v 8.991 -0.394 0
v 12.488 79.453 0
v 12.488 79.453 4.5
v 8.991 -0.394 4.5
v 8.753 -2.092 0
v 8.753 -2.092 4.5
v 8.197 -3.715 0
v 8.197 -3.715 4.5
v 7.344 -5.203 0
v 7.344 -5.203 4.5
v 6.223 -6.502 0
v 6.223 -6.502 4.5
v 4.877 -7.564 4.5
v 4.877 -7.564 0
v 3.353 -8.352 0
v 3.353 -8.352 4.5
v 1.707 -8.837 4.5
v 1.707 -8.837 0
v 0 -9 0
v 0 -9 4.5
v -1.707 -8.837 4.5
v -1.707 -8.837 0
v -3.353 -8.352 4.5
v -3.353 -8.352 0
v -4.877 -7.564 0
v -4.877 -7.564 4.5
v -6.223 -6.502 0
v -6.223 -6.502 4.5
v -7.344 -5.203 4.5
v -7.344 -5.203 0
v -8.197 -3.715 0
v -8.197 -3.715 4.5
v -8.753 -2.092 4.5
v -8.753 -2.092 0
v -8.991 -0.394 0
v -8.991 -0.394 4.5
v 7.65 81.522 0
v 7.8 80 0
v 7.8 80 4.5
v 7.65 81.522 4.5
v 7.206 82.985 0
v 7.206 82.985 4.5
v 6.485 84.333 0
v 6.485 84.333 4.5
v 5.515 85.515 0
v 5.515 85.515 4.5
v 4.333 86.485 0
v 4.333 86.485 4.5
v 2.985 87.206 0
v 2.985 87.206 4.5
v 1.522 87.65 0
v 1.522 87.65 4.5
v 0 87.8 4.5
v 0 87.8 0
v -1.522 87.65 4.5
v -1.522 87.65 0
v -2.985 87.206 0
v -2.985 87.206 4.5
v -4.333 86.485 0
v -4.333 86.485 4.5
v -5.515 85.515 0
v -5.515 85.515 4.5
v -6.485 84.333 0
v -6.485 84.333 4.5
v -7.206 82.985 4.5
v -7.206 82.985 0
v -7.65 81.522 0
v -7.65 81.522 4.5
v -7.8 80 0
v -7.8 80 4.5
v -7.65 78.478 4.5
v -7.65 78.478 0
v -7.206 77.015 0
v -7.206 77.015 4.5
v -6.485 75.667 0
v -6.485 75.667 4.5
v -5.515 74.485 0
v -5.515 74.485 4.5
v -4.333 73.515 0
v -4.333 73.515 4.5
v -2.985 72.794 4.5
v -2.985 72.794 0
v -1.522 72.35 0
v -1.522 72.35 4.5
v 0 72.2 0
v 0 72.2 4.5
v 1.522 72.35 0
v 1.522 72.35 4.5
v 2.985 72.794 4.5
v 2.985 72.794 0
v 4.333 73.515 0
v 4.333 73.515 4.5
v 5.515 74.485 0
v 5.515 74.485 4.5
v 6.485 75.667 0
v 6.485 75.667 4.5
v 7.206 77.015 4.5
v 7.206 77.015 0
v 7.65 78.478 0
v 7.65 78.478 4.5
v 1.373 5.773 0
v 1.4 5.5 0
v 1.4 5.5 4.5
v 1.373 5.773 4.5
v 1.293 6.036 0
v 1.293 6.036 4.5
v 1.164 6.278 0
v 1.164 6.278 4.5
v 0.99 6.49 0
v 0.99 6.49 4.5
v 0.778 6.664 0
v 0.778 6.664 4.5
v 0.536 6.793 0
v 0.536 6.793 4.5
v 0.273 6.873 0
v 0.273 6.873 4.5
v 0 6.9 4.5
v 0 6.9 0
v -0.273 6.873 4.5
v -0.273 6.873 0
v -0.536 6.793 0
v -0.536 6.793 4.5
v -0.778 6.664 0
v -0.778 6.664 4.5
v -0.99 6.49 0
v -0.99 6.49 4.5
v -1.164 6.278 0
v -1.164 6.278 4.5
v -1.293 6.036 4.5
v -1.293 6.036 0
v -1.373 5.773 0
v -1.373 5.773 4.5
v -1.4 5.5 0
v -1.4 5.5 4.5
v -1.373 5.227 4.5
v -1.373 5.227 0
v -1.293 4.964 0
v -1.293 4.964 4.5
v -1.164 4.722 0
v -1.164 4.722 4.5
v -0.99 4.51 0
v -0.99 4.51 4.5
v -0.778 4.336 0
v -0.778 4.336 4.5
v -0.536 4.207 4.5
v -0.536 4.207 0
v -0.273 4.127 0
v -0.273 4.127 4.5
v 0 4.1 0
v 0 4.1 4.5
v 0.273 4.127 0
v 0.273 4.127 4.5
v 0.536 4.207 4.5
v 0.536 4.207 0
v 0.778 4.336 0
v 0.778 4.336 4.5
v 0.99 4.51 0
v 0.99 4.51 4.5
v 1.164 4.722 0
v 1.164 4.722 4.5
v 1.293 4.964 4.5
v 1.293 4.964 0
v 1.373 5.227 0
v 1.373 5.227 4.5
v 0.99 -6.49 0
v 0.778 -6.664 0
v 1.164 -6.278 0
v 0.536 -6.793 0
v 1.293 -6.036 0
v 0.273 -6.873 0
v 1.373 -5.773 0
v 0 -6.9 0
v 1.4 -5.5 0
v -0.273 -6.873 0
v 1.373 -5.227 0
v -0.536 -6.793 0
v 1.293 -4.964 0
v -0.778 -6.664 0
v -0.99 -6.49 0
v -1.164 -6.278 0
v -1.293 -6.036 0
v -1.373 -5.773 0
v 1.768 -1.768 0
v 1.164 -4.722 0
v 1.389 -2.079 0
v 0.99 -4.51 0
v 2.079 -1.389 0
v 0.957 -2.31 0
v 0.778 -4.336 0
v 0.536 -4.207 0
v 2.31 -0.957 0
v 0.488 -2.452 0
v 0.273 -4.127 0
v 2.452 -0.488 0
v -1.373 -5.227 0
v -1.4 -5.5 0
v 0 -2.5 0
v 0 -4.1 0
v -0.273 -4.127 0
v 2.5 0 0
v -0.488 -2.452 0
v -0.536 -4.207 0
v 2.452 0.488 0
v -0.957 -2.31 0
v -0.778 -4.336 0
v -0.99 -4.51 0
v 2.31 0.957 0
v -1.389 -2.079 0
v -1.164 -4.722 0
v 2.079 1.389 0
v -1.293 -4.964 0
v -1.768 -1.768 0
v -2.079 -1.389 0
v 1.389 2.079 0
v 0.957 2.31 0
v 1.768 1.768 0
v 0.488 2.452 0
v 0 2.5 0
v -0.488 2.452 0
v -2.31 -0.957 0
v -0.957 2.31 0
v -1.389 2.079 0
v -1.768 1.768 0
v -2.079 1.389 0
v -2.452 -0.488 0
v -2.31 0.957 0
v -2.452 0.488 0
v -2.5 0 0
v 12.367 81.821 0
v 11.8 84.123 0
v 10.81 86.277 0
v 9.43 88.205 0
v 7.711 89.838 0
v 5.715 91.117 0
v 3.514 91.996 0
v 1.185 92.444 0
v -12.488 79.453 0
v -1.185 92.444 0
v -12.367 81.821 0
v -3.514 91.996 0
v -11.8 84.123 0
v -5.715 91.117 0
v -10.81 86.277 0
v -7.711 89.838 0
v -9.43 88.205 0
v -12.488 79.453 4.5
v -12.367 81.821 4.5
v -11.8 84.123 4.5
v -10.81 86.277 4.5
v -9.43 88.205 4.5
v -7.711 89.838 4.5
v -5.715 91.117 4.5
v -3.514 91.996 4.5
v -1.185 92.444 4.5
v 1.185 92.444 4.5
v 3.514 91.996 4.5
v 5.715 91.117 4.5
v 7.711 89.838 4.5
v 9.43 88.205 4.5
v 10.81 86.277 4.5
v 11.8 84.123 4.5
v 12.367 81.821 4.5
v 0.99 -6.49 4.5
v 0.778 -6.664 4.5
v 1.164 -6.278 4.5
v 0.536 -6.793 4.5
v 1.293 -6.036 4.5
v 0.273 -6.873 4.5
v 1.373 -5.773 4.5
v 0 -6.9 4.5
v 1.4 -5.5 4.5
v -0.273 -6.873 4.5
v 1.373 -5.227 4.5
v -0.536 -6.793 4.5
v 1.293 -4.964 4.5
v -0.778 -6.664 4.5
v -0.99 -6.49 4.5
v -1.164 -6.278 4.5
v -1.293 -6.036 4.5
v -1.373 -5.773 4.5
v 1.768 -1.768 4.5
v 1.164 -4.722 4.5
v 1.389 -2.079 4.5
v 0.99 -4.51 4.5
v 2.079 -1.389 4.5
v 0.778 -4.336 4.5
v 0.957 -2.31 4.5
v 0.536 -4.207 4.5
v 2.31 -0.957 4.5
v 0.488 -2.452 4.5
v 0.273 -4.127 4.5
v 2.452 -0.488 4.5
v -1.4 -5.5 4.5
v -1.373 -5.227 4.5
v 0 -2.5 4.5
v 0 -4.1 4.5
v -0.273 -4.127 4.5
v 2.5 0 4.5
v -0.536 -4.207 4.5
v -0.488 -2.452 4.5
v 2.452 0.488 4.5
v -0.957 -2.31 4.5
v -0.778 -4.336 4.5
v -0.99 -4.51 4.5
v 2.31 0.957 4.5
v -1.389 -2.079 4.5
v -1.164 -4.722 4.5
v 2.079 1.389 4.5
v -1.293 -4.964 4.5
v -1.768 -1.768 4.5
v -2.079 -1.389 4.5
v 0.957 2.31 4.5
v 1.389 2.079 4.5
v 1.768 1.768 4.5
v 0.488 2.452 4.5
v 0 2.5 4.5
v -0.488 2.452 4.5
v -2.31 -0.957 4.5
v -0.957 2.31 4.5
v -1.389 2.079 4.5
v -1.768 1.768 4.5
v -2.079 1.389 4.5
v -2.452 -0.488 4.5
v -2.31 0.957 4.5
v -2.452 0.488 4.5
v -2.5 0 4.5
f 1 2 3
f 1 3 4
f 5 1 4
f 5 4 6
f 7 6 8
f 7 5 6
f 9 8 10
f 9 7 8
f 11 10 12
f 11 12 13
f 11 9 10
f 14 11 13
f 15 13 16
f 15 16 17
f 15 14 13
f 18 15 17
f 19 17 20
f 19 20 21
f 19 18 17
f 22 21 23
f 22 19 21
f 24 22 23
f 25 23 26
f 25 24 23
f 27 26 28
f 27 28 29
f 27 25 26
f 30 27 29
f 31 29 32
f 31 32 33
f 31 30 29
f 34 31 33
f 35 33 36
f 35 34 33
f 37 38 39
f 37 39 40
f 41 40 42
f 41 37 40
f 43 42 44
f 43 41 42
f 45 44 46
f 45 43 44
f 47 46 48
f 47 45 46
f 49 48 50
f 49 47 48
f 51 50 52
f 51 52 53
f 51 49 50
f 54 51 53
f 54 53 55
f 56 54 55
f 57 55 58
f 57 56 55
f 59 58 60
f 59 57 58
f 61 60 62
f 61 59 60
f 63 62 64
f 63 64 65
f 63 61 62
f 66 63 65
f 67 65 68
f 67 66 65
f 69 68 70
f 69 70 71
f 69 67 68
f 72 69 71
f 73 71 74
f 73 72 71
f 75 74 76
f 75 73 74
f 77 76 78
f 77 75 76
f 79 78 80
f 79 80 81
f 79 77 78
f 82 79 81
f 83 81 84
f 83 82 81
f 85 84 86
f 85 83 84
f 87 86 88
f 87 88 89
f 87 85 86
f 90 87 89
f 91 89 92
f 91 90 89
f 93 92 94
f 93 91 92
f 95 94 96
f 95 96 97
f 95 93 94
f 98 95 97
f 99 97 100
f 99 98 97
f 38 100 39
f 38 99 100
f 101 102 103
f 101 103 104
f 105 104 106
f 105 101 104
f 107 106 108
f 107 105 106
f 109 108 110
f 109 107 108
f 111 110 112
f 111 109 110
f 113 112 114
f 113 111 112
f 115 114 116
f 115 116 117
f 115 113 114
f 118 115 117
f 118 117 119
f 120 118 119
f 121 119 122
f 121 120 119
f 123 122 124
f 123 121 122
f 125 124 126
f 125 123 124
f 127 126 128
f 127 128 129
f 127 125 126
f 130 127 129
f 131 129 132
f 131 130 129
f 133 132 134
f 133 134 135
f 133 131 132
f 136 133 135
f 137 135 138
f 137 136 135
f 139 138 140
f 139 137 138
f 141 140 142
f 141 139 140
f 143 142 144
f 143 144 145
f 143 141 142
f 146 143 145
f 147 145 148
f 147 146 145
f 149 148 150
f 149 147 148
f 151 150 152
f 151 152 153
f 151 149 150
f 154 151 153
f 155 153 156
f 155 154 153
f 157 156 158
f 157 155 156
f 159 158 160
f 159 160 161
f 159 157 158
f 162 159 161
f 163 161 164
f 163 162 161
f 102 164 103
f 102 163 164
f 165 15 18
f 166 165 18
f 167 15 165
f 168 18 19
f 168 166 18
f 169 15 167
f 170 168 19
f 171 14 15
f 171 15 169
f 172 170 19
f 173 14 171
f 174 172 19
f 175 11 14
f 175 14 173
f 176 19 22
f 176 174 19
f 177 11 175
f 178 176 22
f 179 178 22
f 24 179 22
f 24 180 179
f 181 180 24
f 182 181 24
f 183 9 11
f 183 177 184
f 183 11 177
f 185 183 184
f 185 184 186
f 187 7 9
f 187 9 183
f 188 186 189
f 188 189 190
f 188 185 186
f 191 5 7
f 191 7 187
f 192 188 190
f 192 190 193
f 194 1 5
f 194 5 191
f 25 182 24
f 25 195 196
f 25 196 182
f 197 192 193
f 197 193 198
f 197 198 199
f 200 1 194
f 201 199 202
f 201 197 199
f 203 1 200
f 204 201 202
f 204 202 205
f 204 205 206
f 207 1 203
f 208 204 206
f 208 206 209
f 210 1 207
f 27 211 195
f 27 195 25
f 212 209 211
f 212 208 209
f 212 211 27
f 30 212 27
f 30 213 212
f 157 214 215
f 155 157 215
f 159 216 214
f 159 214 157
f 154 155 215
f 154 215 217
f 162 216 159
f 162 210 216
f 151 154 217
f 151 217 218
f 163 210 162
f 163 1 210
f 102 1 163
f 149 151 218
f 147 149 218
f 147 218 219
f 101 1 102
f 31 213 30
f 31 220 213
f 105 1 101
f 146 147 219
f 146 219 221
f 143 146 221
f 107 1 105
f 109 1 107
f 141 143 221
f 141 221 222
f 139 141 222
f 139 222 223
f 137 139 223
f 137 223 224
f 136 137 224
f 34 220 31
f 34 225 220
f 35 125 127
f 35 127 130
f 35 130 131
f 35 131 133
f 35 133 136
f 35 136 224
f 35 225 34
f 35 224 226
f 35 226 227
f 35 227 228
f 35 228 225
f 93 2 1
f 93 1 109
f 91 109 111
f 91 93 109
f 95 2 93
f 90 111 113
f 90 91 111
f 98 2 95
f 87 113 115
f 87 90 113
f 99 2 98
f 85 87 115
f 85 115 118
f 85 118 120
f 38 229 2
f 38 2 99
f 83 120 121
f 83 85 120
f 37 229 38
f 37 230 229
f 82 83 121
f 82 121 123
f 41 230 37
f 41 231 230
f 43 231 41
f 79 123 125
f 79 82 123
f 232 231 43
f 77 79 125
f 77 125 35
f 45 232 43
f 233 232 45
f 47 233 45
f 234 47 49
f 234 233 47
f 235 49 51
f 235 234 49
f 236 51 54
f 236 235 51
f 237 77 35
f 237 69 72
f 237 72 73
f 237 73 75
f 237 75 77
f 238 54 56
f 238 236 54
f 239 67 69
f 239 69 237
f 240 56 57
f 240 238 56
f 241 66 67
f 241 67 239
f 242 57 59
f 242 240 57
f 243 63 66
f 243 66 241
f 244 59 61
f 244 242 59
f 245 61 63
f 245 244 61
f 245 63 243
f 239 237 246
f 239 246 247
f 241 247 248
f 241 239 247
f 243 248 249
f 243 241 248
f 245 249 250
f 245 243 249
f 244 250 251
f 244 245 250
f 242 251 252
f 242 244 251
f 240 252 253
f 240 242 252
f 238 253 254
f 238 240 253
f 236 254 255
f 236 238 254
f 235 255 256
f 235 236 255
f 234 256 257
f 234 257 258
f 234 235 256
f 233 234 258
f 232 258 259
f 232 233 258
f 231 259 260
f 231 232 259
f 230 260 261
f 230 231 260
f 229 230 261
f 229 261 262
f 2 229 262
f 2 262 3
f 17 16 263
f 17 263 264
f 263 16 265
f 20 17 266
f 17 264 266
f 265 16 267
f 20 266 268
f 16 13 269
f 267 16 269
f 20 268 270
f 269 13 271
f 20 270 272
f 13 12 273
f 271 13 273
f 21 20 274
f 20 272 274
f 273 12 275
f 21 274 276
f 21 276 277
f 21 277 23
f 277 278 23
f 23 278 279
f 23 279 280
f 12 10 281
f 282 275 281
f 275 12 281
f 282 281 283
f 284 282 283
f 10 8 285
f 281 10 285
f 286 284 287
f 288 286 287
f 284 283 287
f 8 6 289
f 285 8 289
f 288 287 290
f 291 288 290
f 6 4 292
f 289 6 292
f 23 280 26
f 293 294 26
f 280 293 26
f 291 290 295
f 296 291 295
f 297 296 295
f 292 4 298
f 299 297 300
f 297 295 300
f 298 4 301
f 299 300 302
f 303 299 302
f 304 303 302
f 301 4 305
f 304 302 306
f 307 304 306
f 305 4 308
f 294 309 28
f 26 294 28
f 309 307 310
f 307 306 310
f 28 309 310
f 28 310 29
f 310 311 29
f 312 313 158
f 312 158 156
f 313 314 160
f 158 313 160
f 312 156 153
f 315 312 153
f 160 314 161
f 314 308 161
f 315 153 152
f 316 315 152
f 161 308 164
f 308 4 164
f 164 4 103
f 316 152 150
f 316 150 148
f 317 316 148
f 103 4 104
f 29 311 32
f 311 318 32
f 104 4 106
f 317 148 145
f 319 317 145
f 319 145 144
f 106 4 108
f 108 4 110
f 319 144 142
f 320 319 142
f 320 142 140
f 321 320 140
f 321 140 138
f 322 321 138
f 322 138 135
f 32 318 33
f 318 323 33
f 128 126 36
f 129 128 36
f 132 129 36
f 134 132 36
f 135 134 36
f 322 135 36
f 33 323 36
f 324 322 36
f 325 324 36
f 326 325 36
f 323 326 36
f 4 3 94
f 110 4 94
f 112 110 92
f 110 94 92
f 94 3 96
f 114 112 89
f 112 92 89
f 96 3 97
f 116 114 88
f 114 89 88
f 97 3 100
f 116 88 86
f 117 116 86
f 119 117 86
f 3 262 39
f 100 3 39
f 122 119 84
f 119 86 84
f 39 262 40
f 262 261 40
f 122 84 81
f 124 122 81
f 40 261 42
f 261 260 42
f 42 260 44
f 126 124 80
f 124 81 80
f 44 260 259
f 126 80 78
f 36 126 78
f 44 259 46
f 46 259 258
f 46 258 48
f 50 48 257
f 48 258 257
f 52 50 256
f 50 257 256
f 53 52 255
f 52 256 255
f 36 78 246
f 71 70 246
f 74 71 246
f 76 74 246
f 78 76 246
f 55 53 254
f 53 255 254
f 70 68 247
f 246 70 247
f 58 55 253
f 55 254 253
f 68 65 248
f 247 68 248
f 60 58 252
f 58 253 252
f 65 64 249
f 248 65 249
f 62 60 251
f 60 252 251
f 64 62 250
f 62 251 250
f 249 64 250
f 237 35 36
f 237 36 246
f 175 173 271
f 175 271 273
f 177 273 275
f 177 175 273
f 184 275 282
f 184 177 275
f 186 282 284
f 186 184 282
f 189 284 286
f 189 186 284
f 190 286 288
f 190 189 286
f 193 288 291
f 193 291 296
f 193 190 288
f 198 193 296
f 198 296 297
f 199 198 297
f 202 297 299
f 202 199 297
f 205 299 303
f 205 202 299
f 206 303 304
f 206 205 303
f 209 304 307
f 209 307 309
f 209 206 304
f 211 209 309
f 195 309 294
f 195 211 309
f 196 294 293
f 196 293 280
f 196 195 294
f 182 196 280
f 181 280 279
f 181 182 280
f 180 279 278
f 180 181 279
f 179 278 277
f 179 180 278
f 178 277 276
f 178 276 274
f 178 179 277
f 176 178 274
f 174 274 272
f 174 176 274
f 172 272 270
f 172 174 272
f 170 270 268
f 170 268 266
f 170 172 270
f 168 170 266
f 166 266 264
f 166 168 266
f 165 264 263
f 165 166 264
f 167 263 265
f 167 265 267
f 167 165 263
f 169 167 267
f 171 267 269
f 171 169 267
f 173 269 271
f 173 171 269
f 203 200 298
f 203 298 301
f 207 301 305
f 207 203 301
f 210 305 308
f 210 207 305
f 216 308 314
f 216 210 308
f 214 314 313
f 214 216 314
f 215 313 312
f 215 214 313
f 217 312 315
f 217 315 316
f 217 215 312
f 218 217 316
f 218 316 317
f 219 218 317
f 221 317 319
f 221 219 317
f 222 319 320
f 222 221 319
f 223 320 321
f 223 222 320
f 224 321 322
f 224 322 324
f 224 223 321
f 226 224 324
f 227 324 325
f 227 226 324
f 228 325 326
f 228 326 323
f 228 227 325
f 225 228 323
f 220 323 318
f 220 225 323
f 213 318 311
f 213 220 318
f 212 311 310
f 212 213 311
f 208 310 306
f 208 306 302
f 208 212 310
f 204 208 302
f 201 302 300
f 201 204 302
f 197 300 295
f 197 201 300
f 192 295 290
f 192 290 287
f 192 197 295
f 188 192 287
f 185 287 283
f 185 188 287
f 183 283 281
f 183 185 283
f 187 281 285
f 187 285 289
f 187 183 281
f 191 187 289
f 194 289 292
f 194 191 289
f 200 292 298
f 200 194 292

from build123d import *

# Parameters (mm, degrees)
SKETCH1_R           = 7.8
SKETCH1_R_2         = 2.5
SKETCH1_R_3         = 1.4
BOSS_EXTRUDE1_DEPTH = 4.5


with BuildPart() as part:
    # Sketch1 → Boss-Extrude1 (new body)
    with BuildSketch(Plane.XY):
        with BuildLine():
            Line((-8.991382593, -0.39375), (-12.488031379, 79.453125))
            ThreePointArc((-12.488031379, 79.453125), (0, 92.5), (12.488031379, 79.453125))
            Line((12.488031379, 79.453125), (8.991382593, -0.39375))
            ThreePointArc((8.991382593, -0.39375), (0, -9), (-8.991382593, -0.39375))
        make_face()
        with Locations((0, 80)):
            Circle(SKETCH1_R, mode=Mode.SUBTRACT)
        Circle(SKETCH1_R_2, mode=Mode.SUBTRACT)
        with Locations((0, 5.5)):
            Circle(SKETCH1_R_3, mode=Mode.SUBTRACT)
        with Locations((0, -5.5)):
            Circle(SKETCH1_R_3, mode=Mode.SUBTRACT)
    extrude(amount=BOSS_EXTRUDE1_DEPTH)


solid = part.part
